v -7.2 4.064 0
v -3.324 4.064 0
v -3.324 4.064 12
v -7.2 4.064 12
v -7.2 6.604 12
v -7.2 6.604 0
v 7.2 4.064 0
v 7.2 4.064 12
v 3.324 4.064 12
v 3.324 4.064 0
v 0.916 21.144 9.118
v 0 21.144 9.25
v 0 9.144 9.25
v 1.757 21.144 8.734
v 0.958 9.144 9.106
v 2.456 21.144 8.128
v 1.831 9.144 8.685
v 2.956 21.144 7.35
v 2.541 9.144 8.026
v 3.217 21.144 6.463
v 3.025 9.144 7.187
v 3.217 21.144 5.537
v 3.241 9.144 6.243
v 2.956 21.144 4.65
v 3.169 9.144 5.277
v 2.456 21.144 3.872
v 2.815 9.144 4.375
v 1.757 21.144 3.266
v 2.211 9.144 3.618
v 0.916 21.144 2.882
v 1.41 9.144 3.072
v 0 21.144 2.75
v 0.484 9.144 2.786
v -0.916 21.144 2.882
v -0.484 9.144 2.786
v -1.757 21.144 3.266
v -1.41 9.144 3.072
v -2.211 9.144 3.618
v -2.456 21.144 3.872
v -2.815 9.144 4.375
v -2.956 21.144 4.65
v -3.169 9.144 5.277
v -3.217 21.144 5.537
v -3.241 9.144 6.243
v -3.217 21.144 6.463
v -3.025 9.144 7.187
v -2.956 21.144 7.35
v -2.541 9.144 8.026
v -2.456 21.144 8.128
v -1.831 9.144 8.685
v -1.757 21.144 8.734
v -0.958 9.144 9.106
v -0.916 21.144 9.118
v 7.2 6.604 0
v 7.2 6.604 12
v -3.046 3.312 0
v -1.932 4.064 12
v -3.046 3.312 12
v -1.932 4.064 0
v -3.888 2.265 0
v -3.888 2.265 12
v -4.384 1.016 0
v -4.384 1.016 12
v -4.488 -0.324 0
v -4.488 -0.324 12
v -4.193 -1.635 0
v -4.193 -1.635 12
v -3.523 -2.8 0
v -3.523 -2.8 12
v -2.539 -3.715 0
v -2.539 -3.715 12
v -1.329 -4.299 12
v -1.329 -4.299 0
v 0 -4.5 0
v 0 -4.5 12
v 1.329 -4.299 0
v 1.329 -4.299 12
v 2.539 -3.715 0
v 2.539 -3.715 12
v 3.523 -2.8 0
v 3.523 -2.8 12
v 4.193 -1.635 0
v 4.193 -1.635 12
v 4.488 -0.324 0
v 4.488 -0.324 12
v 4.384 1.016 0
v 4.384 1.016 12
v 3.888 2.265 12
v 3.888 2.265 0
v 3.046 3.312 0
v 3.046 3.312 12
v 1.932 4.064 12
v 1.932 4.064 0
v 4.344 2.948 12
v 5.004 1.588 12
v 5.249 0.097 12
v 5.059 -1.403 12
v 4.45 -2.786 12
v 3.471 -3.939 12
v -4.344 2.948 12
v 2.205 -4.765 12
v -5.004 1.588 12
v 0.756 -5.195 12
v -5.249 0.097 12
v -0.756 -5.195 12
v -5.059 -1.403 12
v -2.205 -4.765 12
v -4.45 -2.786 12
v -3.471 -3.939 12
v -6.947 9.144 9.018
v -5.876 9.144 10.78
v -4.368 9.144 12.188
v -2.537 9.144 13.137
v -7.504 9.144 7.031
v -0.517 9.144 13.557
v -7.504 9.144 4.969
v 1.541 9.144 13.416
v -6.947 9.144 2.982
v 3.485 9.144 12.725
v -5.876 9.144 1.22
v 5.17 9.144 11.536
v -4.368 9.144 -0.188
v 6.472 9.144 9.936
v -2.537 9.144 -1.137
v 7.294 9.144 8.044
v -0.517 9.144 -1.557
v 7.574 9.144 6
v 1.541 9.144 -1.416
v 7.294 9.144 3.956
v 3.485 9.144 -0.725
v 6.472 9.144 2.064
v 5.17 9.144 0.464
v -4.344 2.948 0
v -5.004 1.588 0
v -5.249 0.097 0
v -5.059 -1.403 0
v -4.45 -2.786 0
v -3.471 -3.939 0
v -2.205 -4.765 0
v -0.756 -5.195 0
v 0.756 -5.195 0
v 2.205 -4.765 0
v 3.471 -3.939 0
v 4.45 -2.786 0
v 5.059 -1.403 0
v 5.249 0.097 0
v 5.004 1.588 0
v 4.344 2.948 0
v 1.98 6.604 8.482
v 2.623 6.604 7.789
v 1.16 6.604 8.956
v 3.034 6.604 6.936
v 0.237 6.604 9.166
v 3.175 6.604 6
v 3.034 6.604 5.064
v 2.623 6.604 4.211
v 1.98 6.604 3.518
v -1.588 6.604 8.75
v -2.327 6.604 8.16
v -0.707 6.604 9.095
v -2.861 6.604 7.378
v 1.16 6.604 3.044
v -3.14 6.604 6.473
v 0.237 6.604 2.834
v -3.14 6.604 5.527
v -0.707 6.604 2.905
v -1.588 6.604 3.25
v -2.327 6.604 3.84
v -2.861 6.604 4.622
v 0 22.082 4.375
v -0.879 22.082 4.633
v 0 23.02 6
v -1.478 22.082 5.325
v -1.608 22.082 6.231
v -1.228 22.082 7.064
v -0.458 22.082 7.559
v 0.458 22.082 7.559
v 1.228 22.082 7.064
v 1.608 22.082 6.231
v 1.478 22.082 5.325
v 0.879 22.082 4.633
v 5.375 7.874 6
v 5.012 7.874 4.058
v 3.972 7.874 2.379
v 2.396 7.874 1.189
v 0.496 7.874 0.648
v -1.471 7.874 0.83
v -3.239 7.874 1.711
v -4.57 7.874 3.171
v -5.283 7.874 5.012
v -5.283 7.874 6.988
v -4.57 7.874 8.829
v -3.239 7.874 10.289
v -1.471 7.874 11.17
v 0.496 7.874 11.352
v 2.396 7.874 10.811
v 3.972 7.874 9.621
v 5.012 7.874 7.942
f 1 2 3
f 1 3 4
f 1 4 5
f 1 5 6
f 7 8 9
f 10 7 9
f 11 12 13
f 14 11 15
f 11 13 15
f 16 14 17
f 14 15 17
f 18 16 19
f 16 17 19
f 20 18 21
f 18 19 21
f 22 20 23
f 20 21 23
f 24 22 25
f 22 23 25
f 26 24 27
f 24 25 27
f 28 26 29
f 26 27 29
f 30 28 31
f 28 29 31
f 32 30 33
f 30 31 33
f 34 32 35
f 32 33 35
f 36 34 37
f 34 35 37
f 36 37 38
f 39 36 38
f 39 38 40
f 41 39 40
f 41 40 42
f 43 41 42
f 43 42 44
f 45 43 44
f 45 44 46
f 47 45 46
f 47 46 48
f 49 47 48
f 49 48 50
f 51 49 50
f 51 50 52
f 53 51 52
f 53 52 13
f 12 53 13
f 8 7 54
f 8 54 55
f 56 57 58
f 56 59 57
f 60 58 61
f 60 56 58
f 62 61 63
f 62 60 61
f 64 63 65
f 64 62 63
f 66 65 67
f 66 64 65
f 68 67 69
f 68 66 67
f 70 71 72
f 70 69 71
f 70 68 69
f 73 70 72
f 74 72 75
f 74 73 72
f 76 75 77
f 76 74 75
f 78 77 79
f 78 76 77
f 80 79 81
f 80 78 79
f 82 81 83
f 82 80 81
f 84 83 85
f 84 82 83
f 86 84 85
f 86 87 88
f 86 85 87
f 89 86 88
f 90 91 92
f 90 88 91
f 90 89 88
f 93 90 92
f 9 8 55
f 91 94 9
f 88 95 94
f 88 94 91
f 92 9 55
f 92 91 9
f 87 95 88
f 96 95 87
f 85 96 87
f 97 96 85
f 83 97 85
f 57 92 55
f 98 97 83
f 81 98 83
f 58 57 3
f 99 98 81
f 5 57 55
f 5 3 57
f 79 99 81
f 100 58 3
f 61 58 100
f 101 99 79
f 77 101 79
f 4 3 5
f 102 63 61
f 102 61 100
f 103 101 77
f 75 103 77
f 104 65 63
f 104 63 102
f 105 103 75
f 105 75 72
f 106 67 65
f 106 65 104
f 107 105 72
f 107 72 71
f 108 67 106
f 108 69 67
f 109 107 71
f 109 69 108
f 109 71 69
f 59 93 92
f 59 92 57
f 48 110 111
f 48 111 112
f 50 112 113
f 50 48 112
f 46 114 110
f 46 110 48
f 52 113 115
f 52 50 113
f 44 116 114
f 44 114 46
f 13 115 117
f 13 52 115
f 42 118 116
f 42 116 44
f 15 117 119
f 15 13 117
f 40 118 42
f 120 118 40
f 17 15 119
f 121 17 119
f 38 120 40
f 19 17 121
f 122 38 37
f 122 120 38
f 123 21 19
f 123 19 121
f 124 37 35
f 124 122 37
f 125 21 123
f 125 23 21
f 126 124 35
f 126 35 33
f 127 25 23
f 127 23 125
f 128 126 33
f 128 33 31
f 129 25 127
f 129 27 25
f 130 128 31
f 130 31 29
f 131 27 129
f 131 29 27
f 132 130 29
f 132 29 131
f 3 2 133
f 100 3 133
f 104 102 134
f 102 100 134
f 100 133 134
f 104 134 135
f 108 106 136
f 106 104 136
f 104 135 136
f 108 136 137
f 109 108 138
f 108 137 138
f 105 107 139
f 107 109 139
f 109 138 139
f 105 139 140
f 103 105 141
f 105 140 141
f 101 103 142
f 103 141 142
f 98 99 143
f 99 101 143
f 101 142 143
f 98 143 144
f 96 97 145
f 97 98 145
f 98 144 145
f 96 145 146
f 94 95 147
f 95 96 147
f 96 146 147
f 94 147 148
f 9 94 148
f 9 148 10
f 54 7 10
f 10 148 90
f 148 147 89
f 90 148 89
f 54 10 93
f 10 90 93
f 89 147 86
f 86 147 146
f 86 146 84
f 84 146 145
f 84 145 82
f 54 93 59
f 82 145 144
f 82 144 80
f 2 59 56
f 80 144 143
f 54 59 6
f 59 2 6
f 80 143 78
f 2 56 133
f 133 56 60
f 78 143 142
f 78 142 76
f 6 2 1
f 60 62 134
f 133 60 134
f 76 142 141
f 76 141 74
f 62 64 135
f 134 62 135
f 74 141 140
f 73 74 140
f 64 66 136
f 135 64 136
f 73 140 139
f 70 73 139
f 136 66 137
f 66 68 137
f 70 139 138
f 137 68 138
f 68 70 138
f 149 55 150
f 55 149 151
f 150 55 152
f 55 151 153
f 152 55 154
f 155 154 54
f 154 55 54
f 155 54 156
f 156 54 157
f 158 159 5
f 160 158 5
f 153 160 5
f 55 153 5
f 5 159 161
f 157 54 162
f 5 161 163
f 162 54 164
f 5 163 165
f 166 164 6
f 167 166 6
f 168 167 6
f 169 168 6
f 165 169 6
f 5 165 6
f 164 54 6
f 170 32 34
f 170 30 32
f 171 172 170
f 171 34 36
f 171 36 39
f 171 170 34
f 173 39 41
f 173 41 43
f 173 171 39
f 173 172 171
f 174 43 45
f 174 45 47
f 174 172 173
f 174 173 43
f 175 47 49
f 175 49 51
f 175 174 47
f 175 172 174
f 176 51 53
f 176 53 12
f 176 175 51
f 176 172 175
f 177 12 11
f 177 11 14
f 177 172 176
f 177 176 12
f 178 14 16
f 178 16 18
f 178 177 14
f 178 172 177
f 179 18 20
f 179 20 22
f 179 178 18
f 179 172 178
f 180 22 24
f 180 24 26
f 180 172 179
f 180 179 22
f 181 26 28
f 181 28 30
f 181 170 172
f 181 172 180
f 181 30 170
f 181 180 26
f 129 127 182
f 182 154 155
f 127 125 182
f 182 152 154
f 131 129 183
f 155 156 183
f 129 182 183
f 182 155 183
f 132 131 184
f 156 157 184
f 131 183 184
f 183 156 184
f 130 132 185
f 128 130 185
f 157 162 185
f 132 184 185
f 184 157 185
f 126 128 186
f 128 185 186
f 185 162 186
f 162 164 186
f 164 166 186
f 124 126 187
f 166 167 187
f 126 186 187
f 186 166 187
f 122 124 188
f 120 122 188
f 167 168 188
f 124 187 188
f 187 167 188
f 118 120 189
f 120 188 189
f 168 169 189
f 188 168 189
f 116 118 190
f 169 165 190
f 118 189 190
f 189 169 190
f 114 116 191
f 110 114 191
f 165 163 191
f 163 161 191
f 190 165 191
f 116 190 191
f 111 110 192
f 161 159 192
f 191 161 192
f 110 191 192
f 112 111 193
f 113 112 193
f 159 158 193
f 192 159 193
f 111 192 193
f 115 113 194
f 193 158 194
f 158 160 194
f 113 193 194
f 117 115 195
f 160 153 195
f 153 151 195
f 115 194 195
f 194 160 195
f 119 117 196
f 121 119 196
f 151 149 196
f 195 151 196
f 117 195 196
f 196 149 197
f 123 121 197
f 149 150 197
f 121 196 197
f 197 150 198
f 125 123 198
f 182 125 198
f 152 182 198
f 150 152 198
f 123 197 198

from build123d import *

# Parameters (mm, degrees)
SKETCH1_R           = 5.25
SKETCH1_R_2         = 4.5
BOSS_EXTRUDE1_DEPTH = 12
BOSS_EXTRUDE2_DEPTH = 2.54
SKETCH3_R           = 3.175
BOSS_EXTRUDE3_DEPTH = 2.54
BOSS_EXTRUDE3_DRAFT = -60
SKETCH4_R           = 3.25
BOSS_EXTRUDE4_DEPTH = 12


with BuildPart() as part:
    # Sketch1 → Boss-Extrude1 (new body)
    with BuildSketch(Plane.XY):
        Circle(SKETCH1_R)
        Circle(SKETCH1_R_2, mode=Mode.SUBTRACT)
    extrude(amount=BOSS_EXTRUDE1_DEPTH)

    # Sketch2 → Boss-Extrude2 (add)
    with BuildSketch(Plane(origin=(0, 4.064, 0), x_dir=(1, 0, 0), z_dir=(0, 1, 0))):
        Polygon((0, 0), (7.2, 0), (7.2, -12), (-7.2, -12), (-7.2, 0), align=None)
    extrude(amount=BOSS_EXTRUDE2_DEPTH)


with BuildPart() as boss_extrude3_tool:
    # Sketch3 → Boss-Extrude3 (with draft: the straight prism first)
    with BuildSketch(Plane(origin=(0, 6.604, 0), x_dir=(1, 0, 0), z_dir=(0, 1, 0))):
        with Locations((0, -6)):
            Circle(SKETCH3_R)
    extrude(amount=BOSS_EXTRUDE3_DEPTH)
    # Boss-Extrude3: the draft: its side faces are tilted about the plane it starts from
    boss_extrude3_sides = [boss_extrude3_tool.faces().sort_by_distance(p)[0] for p in [
        (-3.175, 7.874, 6),
    ]]
    draft(boss_extrude3_sides, Plane(origin=(0, 6.604, 0), x_dir=(1, 0, 0), z_dir=(0, 1, 0)), BOSS_EXTRUDE3_DRAFT)


with BuildPart() as part_1:
    add(part.part)

    # Boss-Extrude3: add boss_extrude3_tool
    add(boss_extrude3_tool.part)

    # Sketch4 → Boss-Extrude4 (add)
    with BuildSketch(Plane(origin=(0, 9.144, 0), x_dir=(1, 0, 0), z_dir=(0, 1, 0))):
        with Locations(Location((0, -6, 0), (0, 0, 270))):
            Circle(SKETCH4_R)
    extrude(amount=BOSS_EXTRUDE4_DEPTH)

    # Boss-Extrude5 cone 1 section (through the dimple's axis) → Boss-Extrude5 (revolve)
    with BuildSketch(Plane(origin=(0, 21.144, 6), x_dir=(0, 0, -1), z_dir=(1, 0, 0))):
        Polygon((0, 0), (3.25, 0), (0, 1.876388375), align=None)
    revolve(axis=Axis((0, 21.144, 6), (0, 1, 0)))


solid = part_1.part
